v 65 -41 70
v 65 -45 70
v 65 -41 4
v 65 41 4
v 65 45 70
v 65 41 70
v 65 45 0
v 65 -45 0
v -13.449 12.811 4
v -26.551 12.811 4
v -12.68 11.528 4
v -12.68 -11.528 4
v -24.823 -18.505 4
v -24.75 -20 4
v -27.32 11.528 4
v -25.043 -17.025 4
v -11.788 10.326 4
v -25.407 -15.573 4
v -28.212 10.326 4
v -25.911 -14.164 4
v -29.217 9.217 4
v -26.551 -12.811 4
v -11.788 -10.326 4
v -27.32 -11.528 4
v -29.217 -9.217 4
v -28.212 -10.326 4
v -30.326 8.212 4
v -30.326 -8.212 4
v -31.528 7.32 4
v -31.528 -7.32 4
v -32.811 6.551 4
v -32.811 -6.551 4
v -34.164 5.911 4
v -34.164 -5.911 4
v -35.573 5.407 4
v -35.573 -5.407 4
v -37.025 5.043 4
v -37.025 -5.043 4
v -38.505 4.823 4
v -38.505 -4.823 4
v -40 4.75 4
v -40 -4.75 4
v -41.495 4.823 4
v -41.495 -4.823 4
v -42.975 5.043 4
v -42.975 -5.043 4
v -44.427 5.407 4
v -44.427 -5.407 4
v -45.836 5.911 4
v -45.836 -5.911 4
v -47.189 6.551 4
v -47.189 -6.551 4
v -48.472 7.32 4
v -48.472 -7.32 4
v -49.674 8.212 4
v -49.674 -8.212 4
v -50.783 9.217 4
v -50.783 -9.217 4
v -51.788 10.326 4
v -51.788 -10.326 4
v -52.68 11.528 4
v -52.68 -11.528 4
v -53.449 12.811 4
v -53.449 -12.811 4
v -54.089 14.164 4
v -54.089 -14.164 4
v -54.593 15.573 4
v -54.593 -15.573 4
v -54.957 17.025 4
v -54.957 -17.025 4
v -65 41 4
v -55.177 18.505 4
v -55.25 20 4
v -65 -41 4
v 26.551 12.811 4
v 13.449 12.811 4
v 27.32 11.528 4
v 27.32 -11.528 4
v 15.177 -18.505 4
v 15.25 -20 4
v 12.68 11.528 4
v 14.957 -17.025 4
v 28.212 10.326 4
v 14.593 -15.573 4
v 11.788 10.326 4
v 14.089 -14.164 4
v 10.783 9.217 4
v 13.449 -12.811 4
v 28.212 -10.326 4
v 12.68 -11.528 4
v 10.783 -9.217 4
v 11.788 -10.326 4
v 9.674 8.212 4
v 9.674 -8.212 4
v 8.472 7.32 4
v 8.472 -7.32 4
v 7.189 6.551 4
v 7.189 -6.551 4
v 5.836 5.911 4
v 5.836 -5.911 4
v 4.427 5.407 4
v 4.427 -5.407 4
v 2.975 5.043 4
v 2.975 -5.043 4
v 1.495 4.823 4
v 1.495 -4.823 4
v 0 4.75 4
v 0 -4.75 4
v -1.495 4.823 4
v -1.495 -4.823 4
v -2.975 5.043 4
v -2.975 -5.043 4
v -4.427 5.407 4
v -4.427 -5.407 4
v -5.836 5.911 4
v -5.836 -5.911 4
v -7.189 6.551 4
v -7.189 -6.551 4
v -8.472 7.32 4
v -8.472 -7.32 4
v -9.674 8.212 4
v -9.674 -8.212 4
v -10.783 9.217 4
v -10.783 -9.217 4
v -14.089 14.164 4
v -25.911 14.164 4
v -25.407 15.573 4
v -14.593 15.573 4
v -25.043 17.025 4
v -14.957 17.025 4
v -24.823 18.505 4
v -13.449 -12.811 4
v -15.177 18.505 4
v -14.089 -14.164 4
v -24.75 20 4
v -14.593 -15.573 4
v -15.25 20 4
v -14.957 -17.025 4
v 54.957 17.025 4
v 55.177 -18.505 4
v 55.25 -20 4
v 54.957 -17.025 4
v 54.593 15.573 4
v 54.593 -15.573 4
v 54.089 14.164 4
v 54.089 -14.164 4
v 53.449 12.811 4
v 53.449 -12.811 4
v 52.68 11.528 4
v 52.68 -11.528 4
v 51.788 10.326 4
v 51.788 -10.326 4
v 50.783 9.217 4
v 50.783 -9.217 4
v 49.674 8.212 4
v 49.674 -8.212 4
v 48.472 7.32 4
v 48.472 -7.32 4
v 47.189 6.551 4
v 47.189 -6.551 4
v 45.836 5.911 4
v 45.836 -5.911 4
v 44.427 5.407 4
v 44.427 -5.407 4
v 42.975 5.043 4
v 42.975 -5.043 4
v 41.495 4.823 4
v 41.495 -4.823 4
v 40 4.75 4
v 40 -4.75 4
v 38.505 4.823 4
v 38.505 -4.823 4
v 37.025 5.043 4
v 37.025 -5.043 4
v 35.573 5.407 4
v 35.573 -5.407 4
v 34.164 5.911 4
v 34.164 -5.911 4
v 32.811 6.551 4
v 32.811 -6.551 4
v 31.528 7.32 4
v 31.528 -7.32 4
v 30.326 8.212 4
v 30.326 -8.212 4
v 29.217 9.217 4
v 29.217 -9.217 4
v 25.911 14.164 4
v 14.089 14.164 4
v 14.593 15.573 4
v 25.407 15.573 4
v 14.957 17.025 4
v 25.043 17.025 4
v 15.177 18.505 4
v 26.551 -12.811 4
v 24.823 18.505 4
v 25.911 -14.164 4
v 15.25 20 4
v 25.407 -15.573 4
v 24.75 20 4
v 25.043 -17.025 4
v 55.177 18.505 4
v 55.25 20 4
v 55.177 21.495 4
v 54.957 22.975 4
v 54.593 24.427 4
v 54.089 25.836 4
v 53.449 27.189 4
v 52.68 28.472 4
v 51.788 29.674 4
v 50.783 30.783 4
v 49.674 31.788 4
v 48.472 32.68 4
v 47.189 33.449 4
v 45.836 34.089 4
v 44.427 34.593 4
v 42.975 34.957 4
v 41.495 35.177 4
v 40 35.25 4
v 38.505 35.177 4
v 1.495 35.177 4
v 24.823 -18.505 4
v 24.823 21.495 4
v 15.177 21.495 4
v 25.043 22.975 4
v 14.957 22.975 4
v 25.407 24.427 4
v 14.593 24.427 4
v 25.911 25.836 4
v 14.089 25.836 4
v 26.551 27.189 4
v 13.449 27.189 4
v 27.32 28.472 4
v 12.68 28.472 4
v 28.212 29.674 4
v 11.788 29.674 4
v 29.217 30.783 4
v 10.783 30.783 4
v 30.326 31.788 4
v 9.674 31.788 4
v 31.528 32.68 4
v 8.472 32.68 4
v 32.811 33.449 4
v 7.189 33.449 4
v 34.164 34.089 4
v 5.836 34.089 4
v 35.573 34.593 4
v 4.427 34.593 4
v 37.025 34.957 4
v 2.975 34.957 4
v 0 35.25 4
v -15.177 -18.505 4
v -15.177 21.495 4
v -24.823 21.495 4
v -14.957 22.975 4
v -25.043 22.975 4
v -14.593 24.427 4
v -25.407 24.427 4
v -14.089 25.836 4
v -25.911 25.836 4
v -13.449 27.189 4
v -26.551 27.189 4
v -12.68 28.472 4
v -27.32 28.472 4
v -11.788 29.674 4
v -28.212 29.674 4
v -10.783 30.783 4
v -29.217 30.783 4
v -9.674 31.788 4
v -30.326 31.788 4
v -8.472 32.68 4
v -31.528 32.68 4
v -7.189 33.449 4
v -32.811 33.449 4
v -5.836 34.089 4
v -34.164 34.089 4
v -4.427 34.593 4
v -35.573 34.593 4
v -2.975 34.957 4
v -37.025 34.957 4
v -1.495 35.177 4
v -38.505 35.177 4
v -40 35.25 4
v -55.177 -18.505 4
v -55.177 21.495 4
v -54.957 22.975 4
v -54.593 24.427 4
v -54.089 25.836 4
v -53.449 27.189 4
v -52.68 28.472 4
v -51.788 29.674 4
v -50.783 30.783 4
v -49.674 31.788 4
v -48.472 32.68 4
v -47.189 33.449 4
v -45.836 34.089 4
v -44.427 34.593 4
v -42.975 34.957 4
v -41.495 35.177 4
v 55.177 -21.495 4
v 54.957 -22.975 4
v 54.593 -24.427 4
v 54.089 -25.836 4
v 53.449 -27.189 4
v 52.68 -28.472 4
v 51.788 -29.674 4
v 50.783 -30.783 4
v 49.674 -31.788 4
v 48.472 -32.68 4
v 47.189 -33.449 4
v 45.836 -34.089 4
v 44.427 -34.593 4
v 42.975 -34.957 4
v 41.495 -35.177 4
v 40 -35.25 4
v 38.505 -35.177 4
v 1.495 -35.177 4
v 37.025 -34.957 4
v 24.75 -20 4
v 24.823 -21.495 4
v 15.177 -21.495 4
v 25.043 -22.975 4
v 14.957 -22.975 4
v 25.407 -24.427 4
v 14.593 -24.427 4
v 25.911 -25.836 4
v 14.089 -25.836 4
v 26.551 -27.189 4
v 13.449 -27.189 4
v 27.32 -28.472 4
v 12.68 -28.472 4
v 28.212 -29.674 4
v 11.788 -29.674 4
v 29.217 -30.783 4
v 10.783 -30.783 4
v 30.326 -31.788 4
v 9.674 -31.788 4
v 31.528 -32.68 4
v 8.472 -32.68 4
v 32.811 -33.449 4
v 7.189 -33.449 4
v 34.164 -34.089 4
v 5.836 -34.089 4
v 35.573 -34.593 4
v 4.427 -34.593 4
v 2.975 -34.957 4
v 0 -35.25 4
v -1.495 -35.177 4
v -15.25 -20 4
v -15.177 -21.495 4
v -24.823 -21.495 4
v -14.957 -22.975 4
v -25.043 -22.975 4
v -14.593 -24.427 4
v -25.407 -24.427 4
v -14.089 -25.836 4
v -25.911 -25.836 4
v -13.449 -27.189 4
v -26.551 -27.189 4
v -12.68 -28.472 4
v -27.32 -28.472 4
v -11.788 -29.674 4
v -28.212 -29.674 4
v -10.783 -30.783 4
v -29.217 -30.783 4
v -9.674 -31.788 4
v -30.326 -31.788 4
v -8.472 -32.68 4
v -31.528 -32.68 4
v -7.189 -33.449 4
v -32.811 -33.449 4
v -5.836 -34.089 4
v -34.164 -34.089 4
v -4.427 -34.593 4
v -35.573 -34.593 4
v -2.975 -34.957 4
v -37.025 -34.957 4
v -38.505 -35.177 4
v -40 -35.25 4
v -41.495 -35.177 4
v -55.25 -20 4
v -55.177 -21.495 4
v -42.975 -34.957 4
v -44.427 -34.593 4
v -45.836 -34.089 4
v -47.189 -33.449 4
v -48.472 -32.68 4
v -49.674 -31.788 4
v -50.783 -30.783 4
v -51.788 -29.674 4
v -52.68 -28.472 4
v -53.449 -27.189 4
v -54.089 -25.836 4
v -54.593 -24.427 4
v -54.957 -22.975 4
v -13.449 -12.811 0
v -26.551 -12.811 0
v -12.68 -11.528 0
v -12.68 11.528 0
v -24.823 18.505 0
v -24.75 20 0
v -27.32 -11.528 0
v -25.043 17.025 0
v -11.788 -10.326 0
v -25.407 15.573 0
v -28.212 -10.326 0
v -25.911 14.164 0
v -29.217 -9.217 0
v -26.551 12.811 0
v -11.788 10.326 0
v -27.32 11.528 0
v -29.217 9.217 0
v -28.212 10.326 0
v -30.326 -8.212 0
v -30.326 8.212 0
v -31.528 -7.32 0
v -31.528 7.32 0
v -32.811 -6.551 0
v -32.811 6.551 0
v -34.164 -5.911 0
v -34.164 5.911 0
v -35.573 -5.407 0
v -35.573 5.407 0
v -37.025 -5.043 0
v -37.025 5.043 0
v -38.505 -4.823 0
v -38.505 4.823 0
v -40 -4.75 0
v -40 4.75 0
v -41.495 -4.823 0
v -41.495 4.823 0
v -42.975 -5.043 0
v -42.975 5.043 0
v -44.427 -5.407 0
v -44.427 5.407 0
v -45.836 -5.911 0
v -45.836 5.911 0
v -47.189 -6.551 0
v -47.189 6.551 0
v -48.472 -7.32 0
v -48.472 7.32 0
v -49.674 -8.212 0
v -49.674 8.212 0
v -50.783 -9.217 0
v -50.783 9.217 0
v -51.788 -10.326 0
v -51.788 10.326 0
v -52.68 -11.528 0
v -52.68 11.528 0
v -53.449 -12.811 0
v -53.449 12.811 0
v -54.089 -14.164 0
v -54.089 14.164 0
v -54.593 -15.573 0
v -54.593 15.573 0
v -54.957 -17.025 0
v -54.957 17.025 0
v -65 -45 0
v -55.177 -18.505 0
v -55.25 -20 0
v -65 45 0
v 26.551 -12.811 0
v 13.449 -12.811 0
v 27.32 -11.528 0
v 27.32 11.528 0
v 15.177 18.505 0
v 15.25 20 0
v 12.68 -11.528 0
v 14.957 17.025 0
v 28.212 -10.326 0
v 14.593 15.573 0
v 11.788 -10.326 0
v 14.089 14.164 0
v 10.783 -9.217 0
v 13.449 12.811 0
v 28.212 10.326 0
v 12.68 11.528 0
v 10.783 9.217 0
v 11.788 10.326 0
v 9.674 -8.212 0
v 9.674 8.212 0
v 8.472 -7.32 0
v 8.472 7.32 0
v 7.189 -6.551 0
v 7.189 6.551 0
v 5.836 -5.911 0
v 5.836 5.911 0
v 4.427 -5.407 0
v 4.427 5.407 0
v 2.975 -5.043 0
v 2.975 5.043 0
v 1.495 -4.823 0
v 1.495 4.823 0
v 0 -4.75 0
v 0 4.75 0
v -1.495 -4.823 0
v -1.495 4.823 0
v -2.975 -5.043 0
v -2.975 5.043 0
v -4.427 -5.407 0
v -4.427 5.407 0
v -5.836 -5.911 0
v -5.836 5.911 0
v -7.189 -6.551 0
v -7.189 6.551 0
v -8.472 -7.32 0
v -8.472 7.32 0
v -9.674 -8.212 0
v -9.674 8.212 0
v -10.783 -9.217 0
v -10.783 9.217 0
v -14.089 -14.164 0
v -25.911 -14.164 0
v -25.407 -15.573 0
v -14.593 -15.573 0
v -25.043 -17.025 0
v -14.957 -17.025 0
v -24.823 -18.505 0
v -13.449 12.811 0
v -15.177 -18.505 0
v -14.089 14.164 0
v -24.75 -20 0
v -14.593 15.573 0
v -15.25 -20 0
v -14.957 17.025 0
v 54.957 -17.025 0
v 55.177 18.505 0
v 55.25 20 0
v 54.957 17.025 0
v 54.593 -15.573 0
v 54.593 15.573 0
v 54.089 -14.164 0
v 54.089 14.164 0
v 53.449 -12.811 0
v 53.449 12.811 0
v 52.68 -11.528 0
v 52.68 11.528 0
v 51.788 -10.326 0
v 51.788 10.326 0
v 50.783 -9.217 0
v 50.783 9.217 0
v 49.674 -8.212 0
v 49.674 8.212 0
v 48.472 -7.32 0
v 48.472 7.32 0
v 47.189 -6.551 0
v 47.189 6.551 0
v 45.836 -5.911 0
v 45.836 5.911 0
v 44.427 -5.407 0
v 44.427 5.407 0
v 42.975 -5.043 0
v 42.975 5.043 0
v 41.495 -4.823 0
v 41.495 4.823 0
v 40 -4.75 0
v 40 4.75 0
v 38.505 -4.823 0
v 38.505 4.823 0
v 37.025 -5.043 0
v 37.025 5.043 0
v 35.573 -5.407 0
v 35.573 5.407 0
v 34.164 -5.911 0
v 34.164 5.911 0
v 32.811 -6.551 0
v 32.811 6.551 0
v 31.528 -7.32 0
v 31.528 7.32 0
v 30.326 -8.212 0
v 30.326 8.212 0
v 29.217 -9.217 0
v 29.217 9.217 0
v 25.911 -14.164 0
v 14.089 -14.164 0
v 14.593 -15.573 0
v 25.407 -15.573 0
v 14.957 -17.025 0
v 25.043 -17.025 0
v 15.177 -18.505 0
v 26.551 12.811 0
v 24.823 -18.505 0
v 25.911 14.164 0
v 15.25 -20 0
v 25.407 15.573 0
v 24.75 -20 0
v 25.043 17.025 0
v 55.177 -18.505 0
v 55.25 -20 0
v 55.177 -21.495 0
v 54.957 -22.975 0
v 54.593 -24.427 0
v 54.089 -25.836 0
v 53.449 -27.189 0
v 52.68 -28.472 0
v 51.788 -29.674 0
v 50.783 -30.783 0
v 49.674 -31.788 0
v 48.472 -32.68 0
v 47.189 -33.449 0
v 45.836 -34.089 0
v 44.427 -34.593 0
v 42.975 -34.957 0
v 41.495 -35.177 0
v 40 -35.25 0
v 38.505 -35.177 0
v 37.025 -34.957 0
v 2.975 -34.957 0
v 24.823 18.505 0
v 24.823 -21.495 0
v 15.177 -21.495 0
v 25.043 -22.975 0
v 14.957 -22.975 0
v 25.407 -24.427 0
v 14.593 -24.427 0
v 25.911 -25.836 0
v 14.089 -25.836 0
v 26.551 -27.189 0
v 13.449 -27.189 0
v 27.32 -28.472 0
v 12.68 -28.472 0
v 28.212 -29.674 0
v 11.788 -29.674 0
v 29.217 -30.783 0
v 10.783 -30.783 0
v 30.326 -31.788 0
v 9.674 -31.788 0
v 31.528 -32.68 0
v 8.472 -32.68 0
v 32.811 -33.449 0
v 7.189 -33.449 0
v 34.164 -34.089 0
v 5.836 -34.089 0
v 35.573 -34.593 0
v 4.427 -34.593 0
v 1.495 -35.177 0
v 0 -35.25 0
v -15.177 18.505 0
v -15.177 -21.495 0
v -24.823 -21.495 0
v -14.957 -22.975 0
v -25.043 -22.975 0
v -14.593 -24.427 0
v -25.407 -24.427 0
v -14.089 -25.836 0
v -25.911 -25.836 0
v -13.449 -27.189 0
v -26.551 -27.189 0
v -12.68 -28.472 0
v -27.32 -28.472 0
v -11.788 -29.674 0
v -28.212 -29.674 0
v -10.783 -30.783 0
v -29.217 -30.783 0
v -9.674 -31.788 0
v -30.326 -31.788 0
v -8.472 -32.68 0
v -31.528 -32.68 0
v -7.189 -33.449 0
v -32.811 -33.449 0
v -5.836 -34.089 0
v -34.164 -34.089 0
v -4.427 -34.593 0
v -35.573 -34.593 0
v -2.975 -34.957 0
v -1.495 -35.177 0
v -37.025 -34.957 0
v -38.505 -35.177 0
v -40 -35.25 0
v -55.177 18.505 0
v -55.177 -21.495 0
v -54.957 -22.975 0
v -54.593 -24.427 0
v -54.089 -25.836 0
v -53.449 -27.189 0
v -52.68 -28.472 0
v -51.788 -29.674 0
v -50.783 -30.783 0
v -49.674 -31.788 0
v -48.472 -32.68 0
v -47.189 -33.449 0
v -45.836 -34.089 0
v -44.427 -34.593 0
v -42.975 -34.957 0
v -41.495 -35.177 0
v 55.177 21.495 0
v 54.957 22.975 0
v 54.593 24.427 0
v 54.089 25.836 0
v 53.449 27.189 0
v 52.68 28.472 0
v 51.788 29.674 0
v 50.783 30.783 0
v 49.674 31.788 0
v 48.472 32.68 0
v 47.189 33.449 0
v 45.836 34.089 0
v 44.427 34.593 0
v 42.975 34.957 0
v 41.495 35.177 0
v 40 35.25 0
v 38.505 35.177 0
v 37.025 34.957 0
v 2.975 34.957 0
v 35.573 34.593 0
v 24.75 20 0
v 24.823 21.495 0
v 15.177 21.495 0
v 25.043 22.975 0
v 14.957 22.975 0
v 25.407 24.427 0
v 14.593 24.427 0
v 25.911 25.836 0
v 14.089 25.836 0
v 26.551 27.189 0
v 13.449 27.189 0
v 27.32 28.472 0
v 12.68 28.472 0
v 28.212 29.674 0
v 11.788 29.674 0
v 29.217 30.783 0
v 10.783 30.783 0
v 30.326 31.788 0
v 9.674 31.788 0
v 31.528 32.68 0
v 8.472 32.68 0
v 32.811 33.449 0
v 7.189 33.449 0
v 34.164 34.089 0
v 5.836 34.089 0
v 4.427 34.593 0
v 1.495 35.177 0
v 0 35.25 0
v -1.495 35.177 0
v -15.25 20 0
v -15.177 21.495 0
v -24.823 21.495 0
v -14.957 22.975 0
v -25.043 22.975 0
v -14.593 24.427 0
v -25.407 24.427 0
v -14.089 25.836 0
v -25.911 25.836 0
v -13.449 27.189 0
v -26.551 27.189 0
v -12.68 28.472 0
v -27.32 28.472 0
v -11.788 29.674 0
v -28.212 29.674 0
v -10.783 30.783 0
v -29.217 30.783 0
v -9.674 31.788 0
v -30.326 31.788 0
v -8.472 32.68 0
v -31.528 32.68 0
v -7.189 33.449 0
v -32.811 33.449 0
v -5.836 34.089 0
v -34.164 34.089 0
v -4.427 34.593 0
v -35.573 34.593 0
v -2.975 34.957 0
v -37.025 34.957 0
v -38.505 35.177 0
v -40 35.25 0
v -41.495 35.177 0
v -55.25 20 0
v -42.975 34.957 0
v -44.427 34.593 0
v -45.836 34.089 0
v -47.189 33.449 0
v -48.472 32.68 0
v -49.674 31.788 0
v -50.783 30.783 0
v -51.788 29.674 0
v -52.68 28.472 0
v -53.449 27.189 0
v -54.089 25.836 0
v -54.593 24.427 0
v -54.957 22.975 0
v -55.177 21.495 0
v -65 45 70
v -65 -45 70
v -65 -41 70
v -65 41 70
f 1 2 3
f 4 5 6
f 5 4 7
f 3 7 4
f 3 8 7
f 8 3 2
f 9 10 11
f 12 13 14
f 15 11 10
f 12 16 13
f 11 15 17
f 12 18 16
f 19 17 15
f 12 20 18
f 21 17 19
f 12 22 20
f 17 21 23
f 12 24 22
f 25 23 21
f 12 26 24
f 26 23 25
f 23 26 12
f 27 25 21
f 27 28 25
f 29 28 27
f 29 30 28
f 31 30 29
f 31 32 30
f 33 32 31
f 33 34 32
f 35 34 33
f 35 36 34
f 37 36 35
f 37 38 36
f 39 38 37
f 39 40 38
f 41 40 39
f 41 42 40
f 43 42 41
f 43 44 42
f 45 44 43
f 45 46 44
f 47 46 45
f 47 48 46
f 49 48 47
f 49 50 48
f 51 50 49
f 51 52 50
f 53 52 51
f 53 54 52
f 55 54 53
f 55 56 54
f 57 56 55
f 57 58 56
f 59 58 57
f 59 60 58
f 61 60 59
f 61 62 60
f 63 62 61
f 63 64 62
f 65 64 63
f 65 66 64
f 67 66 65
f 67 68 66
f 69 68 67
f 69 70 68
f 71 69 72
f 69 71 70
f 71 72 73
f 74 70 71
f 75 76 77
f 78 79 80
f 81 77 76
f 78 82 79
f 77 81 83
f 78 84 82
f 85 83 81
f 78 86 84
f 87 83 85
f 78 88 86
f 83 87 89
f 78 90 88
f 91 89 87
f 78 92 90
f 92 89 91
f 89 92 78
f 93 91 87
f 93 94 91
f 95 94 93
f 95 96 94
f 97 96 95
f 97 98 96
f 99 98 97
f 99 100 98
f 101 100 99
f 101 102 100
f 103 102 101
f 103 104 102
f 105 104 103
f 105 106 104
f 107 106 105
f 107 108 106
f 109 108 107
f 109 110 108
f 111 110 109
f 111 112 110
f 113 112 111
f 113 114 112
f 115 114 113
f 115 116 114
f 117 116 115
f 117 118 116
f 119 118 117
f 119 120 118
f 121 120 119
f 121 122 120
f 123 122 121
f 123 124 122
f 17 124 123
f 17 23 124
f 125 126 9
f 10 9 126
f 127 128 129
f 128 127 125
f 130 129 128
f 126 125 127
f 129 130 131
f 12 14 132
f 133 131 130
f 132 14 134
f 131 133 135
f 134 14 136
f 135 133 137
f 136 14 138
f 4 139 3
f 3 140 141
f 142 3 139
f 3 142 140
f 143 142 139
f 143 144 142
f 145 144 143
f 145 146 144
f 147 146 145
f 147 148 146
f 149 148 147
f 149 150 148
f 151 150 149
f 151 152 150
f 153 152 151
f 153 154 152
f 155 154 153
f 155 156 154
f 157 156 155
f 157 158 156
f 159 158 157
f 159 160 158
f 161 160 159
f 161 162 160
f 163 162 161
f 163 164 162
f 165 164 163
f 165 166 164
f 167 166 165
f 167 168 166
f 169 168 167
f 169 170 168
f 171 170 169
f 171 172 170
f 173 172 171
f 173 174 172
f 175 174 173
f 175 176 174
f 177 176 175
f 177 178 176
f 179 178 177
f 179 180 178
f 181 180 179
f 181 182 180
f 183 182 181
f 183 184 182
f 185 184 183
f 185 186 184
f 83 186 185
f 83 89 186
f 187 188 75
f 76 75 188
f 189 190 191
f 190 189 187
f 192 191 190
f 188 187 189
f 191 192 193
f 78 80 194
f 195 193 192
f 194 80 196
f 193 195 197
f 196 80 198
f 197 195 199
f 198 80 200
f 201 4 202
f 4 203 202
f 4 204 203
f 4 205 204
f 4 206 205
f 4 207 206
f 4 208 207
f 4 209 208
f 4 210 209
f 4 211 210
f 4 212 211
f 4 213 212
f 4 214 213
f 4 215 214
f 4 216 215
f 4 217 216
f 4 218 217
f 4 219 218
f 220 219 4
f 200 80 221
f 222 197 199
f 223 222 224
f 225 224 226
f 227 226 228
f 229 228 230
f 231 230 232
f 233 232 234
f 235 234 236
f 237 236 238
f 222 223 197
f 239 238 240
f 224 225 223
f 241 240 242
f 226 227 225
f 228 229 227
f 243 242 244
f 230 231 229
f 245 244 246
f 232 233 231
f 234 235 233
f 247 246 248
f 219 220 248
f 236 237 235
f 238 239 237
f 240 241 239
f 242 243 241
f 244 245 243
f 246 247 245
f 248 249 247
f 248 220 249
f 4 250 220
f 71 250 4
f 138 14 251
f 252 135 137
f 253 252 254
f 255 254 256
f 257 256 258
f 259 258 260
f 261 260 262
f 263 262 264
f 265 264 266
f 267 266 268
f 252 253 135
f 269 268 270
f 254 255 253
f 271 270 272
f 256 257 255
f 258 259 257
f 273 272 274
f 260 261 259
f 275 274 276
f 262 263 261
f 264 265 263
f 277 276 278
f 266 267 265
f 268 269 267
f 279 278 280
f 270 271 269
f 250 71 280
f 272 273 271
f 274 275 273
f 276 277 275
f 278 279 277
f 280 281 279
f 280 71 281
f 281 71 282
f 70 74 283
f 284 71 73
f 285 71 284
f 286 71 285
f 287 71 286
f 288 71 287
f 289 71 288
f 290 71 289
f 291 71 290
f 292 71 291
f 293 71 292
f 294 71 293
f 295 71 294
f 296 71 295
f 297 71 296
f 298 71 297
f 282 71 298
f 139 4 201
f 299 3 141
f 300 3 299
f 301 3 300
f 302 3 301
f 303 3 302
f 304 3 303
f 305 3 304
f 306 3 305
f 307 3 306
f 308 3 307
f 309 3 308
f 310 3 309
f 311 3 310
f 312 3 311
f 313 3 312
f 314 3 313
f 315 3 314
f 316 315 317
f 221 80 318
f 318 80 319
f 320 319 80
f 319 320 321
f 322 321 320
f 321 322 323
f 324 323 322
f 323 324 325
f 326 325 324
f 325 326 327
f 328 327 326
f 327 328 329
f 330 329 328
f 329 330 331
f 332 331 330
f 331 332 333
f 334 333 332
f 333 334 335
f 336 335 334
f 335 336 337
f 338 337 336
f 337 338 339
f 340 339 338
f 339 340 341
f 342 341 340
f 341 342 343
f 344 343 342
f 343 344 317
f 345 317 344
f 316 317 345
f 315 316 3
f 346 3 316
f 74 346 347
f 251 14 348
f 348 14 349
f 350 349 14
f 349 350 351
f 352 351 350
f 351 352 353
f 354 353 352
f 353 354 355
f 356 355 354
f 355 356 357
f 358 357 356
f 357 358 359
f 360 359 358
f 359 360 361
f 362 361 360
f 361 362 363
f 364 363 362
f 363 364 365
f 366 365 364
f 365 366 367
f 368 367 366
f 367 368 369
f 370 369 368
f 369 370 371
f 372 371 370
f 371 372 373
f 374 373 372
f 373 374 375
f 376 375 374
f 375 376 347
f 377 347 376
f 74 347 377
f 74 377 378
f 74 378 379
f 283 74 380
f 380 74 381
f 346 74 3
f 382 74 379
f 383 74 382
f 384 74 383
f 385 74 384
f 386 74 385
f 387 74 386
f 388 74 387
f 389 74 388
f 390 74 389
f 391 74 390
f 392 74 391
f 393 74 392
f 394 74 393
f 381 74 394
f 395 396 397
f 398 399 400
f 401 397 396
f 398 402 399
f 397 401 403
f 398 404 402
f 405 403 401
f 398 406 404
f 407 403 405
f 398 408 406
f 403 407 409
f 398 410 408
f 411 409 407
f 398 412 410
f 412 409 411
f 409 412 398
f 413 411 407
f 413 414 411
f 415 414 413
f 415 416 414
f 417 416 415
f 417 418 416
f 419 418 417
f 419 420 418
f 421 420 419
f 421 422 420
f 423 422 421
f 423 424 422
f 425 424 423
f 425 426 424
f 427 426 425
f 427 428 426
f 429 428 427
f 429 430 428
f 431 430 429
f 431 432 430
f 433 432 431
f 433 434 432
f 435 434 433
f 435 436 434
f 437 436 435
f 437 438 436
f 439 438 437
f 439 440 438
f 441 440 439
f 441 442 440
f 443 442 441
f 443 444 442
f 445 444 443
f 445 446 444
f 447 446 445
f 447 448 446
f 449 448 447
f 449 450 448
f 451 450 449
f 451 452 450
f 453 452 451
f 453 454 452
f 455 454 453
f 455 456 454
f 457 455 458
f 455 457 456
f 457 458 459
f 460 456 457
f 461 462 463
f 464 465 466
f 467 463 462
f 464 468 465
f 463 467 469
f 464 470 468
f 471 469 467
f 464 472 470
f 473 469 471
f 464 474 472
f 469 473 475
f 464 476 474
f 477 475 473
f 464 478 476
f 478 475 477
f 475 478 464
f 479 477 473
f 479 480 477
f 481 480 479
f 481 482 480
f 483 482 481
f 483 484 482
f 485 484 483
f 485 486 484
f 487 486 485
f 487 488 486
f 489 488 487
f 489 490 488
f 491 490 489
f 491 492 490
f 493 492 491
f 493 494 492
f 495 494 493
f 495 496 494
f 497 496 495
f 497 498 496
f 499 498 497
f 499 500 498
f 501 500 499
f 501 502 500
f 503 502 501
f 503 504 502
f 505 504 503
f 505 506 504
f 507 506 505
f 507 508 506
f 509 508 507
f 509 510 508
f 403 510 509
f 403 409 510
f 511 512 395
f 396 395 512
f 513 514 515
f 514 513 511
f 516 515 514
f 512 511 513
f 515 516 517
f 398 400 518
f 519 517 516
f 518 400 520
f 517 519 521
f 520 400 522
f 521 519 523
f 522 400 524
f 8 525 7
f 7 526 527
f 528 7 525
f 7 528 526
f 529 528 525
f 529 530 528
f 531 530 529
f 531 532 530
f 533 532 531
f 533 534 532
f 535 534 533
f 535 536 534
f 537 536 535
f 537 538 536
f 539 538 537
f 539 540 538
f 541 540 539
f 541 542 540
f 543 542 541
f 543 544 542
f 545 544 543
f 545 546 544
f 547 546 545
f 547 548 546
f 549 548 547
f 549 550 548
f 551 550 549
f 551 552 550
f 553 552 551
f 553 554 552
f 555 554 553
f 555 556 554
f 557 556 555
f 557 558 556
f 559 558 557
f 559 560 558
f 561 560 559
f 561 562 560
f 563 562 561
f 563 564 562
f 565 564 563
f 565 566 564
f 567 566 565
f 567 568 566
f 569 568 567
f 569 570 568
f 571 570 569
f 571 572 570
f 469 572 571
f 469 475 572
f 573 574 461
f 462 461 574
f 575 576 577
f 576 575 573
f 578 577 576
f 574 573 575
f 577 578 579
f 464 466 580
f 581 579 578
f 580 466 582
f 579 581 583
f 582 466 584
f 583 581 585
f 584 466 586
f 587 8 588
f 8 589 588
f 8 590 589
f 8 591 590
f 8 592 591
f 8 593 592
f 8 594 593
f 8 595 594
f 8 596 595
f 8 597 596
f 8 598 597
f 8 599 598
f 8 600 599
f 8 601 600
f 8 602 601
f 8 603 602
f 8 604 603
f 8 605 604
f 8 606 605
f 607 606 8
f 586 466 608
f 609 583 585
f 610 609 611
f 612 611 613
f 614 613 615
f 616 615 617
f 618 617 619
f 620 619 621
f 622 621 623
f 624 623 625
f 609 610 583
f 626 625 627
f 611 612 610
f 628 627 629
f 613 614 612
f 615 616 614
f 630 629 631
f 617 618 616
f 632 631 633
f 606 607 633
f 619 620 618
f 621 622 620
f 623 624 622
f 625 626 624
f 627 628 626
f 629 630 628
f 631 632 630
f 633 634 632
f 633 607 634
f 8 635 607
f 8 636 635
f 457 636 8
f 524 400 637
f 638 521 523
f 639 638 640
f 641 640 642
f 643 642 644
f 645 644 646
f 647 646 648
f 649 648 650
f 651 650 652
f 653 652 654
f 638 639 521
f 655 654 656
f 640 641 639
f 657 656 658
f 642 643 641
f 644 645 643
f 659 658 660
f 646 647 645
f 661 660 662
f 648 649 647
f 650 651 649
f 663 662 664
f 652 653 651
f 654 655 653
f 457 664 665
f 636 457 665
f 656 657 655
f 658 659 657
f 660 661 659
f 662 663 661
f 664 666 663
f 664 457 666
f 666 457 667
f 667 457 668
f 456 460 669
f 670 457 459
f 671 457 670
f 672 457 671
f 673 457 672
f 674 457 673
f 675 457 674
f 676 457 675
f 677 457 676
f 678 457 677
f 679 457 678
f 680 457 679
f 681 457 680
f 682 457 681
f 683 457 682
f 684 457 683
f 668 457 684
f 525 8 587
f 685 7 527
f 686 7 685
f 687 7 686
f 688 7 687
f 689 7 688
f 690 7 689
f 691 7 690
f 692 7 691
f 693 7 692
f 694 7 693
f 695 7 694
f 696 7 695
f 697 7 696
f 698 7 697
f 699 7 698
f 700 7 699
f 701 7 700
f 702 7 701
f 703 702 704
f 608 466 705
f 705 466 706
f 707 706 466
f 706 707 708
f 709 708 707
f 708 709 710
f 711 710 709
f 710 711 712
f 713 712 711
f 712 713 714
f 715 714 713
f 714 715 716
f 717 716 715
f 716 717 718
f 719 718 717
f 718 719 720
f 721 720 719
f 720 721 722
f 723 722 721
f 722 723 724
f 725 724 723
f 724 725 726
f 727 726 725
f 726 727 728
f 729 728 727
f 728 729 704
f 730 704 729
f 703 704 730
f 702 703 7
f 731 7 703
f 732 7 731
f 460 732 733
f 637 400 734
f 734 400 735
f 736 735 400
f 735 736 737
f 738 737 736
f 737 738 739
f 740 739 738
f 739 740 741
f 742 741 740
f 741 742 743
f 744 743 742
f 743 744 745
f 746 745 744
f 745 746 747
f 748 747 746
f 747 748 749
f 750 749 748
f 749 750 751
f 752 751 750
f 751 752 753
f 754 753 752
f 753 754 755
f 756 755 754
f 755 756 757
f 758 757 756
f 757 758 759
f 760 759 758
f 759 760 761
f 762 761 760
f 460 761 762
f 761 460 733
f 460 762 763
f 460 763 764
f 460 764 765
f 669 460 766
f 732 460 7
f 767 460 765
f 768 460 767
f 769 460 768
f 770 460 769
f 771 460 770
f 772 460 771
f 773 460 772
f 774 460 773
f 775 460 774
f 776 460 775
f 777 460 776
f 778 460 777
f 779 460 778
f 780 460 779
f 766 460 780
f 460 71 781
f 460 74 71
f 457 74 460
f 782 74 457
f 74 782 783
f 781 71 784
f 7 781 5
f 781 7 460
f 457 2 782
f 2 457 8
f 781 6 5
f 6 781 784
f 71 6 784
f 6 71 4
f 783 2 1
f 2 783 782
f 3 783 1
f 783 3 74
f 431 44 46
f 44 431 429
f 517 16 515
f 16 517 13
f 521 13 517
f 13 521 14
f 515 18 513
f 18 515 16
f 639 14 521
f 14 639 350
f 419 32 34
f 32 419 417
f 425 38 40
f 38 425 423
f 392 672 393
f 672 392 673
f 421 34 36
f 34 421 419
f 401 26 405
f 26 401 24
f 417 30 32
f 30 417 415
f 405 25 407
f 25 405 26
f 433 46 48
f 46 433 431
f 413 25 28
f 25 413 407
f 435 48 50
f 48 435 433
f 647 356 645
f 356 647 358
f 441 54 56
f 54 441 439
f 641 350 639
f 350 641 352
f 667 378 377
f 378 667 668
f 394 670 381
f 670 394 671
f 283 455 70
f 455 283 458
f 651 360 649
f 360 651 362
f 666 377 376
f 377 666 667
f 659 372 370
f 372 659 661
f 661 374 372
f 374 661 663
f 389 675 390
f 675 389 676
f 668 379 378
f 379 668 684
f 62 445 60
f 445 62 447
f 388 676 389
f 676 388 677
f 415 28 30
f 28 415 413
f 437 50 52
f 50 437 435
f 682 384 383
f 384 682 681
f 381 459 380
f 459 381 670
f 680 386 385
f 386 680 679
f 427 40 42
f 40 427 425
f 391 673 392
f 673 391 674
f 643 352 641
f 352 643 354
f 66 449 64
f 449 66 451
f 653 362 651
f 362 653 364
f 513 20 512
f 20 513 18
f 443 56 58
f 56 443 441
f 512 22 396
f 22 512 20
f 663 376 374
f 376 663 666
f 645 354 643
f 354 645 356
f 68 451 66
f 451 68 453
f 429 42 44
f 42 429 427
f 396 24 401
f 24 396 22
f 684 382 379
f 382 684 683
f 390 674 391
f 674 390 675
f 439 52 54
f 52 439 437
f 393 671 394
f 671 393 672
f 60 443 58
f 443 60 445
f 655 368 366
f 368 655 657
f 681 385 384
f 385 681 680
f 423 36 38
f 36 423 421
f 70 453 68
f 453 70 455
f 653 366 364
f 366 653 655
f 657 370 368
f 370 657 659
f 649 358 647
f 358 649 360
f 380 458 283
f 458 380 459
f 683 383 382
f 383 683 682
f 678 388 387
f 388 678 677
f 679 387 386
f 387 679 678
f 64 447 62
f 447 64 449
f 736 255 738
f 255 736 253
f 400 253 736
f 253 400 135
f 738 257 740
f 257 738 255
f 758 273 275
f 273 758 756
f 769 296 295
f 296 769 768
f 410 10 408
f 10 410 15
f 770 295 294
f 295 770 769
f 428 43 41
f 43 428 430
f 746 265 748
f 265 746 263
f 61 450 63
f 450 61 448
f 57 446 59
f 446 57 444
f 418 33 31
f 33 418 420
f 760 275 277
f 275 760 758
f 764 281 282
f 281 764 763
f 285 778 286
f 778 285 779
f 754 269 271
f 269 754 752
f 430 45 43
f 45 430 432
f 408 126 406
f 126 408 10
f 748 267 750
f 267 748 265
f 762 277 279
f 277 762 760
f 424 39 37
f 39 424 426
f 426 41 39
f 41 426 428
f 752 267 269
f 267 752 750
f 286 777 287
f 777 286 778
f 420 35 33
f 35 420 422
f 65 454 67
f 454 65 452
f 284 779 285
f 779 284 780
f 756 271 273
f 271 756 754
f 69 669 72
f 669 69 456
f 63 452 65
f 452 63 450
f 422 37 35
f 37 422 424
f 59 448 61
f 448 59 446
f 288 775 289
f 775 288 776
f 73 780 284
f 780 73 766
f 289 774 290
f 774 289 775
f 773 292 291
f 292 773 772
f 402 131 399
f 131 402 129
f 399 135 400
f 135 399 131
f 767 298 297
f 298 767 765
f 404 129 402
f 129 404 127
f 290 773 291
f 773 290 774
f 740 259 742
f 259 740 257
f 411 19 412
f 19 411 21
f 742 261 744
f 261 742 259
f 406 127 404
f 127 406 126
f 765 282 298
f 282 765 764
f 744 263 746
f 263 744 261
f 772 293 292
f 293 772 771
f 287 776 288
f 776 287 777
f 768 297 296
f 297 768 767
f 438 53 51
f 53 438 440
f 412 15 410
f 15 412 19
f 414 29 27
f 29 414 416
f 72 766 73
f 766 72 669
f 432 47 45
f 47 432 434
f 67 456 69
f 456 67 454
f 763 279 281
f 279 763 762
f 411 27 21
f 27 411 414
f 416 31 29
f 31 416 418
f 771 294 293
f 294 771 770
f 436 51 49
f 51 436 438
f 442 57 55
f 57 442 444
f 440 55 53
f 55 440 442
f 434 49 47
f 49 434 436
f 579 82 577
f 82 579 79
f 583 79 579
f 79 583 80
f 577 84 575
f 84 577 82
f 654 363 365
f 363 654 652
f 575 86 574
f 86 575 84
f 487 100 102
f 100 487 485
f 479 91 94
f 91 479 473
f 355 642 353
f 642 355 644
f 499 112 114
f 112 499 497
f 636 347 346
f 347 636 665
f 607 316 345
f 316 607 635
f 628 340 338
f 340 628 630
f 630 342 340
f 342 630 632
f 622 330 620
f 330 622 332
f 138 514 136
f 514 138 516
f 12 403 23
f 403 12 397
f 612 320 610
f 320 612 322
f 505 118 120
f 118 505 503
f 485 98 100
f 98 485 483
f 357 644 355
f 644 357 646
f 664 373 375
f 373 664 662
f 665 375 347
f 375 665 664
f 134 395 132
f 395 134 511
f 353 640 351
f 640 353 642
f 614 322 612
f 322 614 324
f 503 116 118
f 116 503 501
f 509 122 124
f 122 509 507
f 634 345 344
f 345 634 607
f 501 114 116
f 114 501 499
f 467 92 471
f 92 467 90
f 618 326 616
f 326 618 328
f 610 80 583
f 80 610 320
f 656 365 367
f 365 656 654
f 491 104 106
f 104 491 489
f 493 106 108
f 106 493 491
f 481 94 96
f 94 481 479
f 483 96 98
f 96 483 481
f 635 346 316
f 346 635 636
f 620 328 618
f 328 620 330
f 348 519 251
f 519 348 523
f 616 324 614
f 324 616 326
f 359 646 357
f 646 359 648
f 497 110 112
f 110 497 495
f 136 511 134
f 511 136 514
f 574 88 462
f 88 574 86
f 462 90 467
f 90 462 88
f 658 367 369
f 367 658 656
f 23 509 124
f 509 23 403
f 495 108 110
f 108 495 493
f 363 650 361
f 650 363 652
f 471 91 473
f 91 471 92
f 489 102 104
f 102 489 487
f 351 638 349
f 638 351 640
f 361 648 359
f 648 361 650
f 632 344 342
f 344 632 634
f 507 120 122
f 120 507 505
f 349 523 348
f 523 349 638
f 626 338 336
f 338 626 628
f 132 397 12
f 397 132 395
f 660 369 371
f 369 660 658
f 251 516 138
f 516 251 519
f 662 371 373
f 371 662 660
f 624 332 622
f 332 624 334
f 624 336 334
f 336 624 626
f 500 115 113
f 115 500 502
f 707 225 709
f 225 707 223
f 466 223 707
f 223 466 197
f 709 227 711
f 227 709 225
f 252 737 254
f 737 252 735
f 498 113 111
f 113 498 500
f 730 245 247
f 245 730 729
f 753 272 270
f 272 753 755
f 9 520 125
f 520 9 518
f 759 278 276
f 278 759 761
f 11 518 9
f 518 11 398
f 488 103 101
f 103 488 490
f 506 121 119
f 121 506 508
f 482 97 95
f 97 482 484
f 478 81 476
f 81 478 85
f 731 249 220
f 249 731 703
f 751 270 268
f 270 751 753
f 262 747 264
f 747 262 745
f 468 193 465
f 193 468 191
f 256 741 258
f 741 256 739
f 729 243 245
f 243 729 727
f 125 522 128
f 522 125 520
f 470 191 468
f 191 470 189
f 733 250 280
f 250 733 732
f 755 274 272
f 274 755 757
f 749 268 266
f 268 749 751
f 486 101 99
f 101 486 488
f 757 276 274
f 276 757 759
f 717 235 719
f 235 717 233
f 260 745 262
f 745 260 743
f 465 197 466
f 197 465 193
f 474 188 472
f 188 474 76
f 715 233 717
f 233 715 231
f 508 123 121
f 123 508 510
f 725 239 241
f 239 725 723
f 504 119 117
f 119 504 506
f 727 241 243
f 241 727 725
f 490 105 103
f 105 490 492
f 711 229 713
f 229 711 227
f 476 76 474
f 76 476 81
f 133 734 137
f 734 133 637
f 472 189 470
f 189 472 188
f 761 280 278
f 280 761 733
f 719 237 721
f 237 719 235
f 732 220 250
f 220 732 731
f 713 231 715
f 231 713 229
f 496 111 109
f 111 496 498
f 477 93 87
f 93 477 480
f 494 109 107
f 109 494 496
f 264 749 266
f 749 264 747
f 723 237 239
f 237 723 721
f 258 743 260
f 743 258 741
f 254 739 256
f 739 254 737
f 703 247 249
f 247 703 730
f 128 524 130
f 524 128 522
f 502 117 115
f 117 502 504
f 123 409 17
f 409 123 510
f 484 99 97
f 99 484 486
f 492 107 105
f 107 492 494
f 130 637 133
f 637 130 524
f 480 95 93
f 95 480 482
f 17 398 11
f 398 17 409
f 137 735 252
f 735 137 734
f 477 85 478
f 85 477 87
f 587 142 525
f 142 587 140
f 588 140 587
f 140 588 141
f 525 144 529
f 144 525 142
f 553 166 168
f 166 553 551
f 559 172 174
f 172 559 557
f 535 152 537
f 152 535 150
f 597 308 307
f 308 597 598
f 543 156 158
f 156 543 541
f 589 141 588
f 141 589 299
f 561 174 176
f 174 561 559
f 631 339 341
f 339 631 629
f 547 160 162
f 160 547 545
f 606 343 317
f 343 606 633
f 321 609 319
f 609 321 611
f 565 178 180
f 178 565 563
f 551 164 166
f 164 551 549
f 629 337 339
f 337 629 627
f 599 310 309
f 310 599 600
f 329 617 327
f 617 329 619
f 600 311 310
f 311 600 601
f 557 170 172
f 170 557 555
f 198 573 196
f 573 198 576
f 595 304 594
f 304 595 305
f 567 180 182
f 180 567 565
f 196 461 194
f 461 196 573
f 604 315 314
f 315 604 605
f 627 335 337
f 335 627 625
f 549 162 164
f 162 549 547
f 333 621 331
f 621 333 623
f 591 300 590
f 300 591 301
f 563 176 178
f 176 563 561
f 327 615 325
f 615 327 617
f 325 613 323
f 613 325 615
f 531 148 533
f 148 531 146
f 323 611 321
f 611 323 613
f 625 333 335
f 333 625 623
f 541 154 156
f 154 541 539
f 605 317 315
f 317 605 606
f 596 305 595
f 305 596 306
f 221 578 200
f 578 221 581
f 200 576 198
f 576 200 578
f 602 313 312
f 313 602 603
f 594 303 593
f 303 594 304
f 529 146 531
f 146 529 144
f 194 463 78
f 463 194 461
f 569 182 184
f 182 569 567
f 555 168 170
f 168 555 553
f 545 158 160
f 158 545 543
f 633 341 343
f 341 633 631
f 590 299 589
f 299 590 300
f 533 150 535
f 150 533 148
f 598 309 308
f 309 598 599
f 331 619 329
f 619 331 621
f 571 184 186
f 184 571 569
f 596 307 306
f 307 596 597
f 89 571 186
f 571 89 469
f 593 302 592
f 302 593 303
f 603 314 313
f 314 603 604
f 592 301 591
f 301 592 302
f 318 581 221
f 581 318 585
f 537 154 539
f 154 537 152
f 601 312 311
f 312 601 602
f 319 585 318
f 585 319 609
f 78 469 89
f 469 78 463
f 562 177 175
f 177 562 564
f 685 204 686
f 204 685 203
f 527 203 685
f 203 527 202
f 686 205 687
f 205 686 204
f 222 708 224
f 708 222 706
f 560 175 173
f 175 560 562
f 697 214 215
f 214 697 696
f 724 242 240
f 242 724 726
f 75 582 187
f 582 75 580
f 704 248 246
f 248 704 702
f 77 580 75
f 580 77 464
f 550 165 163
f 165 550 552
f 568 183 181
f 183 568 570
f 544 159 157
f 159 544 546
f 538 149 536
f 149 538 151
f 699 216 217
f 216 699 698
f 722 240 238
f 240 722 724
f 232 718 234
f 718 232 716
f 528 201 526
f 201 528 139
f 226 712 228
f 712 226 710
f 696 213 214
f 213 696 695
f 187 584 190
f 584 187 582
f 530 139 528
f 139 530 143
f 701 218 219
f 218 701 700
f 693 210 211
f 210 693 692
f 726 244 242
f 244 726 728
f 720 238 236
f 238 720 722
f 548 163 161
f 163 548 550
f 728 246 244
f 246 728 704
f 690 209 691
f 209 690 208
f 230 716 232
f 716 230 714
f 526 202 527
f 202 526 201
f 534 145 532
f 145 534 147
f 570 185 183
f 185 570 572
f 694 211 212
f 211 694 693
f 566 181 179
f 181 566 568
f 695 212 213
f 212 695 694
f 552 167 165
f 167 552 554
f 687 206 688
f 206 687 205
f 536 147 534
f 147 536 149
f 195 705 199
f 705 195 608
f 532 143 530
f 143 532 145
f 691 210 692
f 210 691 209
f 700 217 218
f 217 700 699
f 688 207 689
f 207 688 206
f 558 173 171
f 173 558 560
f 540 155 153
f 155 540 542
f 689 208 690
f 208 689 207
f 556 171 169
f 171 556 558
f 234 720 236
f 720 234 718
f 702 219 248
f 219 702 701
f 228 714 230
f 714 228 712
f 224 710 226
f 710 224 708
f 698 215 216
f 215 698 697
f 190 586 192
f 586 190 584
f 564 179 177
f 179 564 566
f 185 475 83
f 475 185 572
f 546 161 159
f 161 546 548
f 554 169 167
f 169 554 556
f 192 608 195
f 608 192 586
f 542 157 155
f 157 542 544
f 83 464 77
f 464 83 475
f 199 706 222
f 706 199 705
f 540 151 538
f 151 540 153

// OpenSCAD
// Rack for six 50 mL conical tubes
// Designed to be printed upside down (walls at Z=0 to Z=66) 
// and flipped over to stand on the walls.

// --- Dimensions ---
plate_x      = 130.0; // Length of the plate (X)
plate_y      = 90.0;  // Width of the plate (Y)
plate_z      = 4.0;   // Thickness of the plate (Z)

hole_d       = 30.5;   // Diameter of the tube holes
hole_spacing = 40.0;   // Center-to-center distance between holes

wall_h       = 70.0;   // Total height of the walls from the base plate
wall_t       = 4.0;    // Thickness of the side walls

// --- Derived Parameters ---
// Since the part is printed upside down, the "base" is at Z=0.
// The walls will be modeled as being attached to the bottom of the plate.
// The plate itself will be at Z = wall_h to Z = wall_h + plate_z.
// However, the prompt says: "The plate... lies on the bed (z = 0 to 4)".
// And "Two solid walls... rise from the plate to z = 70".
// This implies the plate is the base (Z=0 to 4) and walls go UP to Z=70.
// BUT the prompt also says: "It is printed upside down and flipped over after printing."
// If it is printed upside down, the "top" of the walls is at Z=0.
// To make the logic simple: We will model it in the "standing" orientation 
// (Plate at Z=0, walls rising to Z=70) and then rotate/translate 
// so the "printing orientation" is correct.

// Printing orientation: Plate is on the bed (Z=0 to 4). 
// Walls rise from the plate to Z=70.
// To print "upside down", we must flip the whole object 180 degrees around X or Y.

$fn = 64;

// Calculate hole positions (centered on plate)
// 3 holes in X, 2 holes in Y.
// Spacing is 40mm. 
// X positions: -40, 0, 40
// Y positions: -20, 20
hole_x_coords = [for (i = [0 : 2]) (i - 1) * hole_spacing];
hole_y_coords = [for (j = [0 : 1]) (j - 0.5) * hole_spacing];

// We model the "Standing" version first:
module rack_standing() {
    union() {
        // The Base Plate
        translate([-plate_x/2, -plate_y/2, 0])
            cube([plate_x, plate_y, plate_z]);
        
        // The Two Side Walls (along the long edges)
        // Long edges are X direction (130mm).
        // Walls are flush with the long edges.
        // Wall 1 at Y = plate_y/2, Wall 2 at Y = -plate_y/2
        // Wall thickness is 4mm.
        
        // Wall 1
        translate([-plate_x/2, plate_y/2 - wall_t, plate_z])
            cube([plate_x, wall_t, wall_h - plate_z]);
            
        // Wall 2
        translate([-plate_x/2, -plate_y/2, plate_z])
            cube([plate_x, wall_t, wall_h - plate_z]);
    }

    // The Holes (subtracted from the plate)
    difference() {
        // We use a large cylinder to ensure clean cuts through the plate
        for (x = hole_x_coords) {
            for (y = hole_y_coords) {
                translate([x, y, -1])
                    cylinder(h = plate_z + 2, d = hole_d);
            }
        }
    }
}

// The prompt asks for the part in "Print Orientation":
// "A flat plate 130 mm (X) by 90 mm (Y) and 4 mm thick lies on the bed (z = 0 to 4)."
// "Two solid walls... rise from the plate to z = 70."
// This describes the "Standing" orientation.
// "It is printed upside down and flipped over after printing."
// This means the user will flip the object. 
// To provide the file in the "Print Orientation" as requested:

// Final Model (Print Orientation: Plate on bed, walls rising up)
difference() {
    // The solid part
    union() {
        // Plate
        translate([-plate_x/2, -plate_y/2, 0])
            cube([plate_x, plate_y, plate_z]);
        
        // Wall 1 (Long edge)
        translate([-plate_x/2, plate_y/2 - wall_t, plate_z])
            cube([plate_x, wall_t, wall_h - plate_z]);
            
        // Wall 2 (Long edge)
        translate([-plate_x/2, -plate_y/2, plate_z])
            cube([plate_x, wall_t, wall_h - plate_z]);
    }

    // The holes
    for (x = hole_x_coords) {
        for (y = hole_y_coords) {
            translate([x, y, -0.5])
                cylinder(h = plate_z + 1, d = hole_d);
        }
    }
}
